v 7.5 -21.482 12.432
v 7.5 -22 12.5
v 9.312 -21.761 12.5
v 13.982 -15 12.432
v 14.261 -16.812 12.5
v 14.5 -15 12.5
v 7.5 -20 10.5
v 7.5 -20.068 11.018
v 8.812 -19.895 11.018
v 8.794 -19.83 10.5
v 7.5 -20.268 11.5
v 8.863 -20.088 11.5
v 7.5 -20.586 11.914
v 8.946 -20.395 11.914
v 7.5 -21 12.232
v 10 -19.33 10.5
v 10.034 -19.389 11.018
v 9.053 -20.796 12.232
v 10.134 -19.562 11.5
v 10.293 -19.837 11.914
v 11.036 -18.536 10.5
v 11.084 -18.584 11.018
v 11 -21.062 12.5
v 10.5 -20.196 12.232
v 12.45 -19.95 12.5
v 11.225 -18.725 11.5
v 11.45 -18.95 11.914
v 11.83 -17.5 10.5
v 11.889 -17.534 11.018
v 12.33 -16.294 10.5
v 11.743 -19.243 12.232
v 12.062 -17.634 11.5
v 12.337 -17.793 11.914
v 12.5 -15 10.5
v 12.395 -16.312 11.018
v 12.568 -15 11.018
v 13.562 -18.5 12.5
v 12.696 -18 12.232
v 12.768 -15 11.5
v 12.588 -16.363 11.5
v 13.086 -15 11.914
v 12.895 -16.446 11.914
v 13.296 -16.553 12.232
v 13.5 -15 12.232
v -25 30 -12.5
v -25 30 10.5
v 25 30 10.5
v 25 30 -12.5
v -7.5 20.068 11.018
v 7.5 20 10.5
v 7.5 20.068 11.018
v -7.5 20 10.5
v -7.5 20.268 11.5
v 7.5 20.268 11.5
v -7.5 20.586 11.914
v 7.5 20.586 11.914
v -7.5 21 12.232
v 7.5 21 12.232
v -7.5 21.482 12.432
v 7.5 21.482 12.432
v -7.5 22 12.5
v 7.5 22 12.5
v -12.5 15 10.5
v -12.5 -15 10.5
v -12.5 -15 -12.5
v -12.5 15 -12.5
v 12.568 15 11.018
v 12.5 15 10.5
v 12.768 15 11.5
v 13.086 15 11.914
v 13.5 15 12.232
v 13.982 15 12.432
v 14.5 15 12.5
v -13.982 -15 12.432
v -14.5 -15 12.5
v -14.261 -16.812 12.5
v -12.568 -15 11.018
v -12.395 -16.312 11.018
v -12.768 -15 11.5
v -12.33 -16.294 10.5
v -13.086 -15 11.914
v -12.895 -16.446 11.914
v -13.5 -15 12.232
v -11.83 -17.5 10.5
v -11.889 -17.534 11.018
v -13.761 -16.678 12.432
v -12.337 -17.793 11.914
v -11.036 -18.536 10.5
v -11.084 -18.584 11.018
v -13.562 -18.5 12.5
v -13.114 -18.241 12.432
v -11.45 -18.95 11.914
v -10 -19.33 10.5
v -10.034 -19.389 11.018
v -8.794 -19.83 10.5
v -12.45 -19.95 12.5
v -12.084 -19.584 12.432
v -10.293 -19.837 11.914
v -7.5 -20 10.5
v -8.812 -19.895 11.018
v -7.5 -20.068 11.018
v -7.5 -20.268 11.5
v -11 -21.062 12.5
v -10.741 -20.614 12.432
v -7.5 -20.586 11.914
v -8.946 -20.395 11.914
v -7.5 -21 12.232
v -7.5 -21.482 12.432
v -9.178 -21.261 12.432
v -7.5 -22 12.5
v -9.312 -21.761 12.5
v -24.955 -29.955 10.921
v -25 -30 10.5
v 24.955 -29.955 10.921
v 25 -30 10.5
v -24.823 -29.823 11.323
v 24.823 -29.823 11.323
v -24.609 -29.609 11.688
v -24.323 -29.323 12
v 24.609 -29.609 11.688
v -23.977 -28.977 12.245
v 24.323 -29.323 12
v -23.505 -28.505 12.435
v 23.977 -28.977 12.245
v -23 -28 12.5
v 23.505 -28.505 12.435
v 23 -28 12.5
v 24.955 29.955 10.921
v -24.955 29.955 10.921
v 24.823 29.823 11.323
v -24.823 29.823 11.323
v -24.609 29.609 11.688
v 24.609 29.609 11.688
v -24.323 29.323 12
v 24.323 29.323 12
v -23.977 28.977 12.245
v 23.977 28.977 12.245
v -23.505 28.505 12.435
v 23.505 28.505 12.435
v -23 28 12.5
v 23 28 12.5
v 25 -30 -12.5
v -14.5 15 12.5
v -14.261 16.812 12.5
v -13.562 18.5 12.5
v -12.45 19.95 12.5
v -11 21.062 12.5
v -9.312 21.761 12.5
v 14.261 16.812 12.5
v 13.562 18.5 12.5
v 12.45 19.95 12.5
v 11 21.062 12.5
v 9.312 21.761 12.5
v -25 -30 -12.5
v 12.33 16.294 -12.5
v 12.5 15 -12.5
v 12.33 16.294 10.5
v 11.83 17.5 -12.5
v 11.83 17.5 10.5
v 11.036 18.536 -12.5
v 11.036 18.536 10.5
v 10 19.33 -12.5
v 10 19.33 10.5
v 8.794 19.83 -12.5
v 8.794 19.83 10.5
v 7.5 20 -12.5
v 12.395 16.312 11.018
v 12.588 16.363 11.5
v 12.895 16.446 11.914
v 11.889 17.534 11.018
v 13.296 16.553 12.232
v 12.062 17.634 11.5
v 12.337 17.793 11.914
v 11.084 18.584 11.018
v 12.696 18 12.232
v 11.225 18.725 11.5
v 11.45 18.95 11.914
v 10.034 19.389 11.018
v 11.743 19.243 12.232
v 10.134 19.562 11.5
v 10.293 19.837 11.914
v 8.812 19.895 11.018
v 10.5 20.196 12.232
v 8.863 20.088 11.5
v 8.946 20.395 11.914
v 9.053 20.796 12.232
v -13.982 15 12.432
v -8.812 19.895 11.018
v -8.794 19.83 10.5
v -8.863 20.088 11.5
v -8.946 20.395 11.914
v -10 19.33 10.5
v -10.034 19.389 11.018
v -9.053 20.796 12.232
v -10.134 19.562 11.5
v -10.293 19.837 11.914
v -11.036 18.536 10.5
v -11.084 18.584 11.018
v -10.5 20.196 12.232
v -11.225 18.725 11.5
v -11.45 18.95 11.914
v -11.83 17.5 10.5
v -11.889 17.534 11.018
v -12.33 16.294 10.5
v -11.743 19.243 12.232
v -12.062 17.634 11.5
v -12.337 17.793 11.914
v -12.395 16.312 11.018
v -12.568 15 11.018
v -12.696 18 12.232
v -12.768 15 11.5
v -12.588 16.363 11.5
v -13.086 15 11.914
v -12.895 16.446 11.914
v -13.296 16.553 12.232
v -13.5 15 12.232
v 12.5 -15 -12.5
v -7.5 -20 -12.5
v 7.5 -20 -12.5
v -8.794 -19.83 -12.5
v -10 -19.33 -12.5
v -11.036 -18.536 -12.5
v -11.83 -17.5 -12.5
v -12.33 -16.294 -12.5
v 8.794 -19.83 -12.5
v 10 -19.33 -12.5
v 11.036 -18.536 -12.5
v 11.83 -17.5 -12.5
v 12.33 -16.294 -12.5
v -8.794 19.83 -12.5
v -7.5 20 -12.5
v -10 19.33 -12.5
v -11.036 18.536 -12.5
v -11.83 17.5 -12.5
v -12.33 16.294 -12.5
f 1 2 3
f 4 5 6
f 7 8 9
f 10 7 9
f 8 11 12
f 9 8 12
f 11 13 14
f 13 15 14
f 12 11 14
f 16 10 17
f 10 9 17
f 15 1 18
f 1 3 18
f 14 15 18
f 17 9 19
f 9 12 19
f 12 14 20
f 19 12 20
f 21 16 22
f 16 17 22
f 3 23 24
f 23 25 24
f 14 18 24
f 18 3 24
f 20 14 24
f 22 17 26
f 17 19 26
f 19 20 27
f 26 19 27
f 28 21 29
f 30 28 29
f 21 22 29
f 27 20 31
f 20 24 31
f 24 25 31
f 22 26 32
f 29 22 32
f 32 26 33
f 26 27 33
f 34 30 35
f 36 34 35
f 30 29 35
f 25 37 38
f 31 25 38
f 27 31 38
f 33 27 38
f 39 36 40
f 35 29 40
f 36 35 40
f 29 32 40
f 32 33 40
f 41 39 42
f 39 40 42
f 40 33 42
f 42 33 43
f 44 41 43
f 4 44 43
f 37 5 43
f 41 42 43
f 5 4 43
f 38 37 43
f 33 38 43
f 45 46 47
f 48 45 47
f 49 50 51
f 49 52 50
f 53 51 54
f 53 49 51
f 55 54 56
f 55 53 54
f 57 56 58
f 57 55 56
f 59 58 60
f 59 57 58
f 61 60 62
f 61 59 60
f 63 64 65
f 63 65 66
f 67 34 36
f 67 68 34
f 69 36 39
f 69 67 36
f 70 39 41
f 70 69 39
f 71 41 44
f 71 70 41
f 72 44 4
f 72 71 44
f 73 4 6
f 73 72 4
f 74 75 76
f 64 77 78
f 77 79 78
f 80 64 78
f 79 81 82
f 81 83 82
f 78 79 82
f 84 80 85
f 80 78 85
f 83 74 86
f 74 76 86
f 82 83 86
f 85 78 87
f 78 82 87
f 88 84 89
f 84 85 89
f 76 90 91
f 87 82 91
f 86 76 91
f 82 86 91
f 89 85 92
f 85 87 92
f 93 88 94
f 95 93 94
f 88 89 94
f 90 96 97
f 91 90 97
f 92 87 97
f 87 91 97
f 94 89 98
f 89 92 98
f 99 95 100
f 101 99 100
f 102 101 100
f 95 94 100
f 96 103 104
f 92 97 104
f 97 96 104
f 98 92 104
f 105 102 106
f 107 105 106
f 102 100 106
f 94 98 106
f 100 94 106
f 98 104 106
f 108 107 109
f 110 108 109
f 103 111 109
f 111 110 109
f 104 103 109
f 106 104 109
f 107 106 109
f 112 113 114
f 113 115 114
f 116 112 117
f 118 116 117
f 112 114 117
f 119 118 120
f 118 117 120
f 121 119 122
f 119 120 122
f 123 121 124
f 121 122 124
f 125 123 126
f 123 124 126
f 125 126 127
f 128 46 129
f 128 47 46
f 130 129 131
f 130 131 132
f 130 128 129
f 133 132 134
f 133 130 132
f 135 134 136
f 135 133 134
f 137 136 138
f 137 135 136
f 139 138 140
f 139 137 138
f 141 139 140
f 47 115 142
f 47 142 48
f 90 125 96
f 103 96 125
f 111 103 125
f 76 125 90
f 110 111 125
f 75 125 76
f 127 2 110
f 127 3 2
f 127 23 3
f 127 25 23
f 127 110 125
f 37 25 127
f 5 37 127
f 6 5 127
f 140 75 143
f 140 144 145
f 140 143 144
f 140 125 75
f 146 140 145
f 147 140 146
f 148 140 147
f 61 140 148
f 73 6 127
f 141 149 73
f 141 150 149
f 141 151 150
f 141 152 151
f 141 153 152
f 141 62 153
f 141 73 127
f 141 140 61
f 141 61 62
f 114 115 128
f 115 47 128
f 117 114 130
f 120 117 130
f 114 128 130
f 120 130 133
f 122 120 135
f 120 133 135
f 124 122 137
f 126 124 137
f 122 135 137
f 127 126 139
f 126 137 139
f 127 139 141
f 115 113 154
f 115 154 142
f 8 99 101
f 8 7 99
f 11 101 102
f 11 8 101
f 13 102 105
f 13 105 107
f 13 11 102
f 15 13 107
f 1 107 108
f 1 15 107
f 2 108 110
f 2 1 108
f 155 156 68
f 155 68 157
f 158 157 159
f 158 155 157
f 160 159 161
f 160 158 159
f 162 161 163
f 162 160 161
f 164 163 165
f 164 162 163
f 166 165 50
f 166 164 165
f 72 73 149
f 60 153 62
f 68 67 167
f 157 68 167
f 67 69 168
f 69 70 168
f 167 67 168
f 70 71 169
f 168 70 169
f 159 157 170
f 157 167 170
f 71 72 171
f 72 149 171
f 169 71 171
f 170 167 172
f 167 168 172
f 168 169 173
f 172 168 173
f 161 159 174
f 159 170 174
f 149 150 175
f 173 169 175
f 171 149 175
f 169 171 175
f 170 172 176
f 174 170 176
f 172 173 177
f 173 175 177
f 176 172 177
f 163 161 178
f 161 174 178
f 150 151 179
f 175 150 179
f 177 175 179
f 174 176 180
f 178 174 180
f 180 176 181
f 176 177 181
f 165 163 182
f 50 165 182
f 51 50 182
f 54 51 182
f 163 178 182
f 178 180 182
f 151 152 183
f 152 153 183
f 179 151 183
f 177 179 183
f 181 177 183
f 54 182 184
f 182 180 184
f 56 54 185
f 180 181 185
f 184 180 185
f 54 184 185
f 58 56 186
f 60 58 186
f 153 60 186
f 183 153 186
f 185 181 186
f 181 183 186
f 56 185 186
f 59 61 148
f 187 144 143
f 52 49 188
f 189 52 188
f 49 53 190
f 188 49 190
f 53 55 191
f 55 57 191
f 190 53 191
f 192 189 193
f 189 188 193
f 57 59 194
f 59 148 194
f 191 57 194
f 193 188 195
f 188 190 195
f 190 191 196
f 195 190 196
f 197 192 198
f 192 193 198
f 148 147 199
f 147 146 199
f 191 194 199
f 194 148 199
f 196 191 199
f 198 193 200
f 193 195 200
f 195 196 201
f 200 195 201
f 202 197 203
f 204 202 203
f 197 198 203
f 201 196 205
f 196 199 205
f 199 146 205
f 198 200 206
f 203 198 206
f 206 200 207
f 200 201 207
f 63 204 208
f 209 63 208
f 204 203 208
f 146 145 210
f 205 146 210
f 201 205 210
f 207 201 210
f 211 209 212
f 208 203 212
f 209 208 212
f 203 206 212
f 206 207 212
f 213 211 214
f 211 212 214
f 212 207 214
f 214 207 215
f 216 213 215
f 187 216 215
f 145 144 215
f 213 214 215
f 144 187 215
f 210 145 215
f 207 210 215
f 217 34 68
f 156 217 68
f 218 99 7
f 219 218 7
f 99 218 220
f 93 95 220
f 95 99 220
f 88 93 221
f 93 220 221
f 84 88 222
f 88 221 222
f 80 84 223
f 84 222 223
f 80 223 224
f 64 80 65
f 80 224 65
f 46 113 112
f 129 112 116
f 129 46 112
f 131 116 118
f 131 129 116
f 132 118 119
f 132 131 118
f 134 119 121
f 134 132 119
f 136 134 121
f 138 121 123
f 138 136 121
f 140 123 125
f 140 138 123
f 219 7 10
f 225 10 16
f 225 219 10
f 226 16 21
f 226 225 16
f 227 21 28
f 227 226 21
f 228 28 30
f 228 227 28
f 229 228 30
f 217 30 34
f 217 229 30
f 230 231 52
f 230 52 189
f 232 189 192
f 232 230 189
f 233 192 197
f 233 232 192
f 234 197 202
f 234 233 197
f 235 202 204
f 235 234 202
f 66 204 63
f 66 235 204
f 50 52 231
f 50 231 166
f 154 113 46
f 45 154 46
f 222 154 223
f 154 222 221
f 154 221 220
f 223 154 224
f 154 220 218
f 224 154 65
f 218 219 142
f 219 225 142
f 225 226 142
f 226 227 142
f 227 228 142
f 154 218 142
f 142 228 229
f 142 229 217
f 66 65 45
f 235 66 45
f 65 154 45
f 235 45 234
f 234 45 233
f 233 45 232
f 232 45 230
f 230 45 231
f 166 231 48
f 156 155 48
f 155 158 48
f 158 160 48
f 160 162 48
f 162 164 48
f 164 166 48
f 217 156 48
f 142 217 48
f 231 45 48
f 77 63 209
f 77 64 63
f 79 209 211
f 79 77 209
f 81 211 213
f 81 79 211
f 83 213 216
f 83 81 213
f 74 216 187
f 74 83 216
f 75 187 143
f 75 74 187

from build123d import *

# Parameters (mm, degrees)
F0_W     = 50
F0_H     = 60
F1_DEPTH = 12.5
F2_W     = 25
F2_H     = 40
F3_DEPTH = 25.001
F4_R     = 5
F5_R     = 2


with BuildPart() as f1:
    # F0 (on Top) → F1 (new body, symmetric)
    with BuildSketch(Plane.XY):
        Rectangle(F0_W, F0_H)
    extrude(amount=F1_DEPTH, both=True)

    # F2 (on face) → F3 (cut, through all)
    with BuildSketch(Plane.XY.offset(12.5)):
        Rectangle(F2_W, F2_H)
    extrude(amount=-F3_DEPTH, mode=Mode.SUBTRACT)

    # F4
    f4_edges = [f1.edges().sort_by_distance(p)[0] for p in [
        (12.5, -20, 0),
        (-12.5, -20, 0),
        (-12.5, 20, 0),
        (12.5, 20, 0),
    ]]
    fillet(f4_edges, radius=F4_R)

    # F5
    f5_edges = [f1.edges().sort_by_distance(p)[0] for p in [
        (0, -20, 12.5),
        (-11.035534, -18.535534, 12.5),
        (11.035534, -18.535534, 12.5),
        (-12.5, 0, 12.5),
        (12.5, 0, 12.5),
        (-11.035534, 18.535534, 12.5),
        (11.035534, 18.535534, 12.5),
        (0, 20, 12.5),
        (25, 0, 12.5),
        (0, -30, 12.5),
        (0, 30, 12.5),
        (-25, 0, 12.5),
    ]]
    fillet(f5_edges, radius=F5_R)


solid = f1.part
